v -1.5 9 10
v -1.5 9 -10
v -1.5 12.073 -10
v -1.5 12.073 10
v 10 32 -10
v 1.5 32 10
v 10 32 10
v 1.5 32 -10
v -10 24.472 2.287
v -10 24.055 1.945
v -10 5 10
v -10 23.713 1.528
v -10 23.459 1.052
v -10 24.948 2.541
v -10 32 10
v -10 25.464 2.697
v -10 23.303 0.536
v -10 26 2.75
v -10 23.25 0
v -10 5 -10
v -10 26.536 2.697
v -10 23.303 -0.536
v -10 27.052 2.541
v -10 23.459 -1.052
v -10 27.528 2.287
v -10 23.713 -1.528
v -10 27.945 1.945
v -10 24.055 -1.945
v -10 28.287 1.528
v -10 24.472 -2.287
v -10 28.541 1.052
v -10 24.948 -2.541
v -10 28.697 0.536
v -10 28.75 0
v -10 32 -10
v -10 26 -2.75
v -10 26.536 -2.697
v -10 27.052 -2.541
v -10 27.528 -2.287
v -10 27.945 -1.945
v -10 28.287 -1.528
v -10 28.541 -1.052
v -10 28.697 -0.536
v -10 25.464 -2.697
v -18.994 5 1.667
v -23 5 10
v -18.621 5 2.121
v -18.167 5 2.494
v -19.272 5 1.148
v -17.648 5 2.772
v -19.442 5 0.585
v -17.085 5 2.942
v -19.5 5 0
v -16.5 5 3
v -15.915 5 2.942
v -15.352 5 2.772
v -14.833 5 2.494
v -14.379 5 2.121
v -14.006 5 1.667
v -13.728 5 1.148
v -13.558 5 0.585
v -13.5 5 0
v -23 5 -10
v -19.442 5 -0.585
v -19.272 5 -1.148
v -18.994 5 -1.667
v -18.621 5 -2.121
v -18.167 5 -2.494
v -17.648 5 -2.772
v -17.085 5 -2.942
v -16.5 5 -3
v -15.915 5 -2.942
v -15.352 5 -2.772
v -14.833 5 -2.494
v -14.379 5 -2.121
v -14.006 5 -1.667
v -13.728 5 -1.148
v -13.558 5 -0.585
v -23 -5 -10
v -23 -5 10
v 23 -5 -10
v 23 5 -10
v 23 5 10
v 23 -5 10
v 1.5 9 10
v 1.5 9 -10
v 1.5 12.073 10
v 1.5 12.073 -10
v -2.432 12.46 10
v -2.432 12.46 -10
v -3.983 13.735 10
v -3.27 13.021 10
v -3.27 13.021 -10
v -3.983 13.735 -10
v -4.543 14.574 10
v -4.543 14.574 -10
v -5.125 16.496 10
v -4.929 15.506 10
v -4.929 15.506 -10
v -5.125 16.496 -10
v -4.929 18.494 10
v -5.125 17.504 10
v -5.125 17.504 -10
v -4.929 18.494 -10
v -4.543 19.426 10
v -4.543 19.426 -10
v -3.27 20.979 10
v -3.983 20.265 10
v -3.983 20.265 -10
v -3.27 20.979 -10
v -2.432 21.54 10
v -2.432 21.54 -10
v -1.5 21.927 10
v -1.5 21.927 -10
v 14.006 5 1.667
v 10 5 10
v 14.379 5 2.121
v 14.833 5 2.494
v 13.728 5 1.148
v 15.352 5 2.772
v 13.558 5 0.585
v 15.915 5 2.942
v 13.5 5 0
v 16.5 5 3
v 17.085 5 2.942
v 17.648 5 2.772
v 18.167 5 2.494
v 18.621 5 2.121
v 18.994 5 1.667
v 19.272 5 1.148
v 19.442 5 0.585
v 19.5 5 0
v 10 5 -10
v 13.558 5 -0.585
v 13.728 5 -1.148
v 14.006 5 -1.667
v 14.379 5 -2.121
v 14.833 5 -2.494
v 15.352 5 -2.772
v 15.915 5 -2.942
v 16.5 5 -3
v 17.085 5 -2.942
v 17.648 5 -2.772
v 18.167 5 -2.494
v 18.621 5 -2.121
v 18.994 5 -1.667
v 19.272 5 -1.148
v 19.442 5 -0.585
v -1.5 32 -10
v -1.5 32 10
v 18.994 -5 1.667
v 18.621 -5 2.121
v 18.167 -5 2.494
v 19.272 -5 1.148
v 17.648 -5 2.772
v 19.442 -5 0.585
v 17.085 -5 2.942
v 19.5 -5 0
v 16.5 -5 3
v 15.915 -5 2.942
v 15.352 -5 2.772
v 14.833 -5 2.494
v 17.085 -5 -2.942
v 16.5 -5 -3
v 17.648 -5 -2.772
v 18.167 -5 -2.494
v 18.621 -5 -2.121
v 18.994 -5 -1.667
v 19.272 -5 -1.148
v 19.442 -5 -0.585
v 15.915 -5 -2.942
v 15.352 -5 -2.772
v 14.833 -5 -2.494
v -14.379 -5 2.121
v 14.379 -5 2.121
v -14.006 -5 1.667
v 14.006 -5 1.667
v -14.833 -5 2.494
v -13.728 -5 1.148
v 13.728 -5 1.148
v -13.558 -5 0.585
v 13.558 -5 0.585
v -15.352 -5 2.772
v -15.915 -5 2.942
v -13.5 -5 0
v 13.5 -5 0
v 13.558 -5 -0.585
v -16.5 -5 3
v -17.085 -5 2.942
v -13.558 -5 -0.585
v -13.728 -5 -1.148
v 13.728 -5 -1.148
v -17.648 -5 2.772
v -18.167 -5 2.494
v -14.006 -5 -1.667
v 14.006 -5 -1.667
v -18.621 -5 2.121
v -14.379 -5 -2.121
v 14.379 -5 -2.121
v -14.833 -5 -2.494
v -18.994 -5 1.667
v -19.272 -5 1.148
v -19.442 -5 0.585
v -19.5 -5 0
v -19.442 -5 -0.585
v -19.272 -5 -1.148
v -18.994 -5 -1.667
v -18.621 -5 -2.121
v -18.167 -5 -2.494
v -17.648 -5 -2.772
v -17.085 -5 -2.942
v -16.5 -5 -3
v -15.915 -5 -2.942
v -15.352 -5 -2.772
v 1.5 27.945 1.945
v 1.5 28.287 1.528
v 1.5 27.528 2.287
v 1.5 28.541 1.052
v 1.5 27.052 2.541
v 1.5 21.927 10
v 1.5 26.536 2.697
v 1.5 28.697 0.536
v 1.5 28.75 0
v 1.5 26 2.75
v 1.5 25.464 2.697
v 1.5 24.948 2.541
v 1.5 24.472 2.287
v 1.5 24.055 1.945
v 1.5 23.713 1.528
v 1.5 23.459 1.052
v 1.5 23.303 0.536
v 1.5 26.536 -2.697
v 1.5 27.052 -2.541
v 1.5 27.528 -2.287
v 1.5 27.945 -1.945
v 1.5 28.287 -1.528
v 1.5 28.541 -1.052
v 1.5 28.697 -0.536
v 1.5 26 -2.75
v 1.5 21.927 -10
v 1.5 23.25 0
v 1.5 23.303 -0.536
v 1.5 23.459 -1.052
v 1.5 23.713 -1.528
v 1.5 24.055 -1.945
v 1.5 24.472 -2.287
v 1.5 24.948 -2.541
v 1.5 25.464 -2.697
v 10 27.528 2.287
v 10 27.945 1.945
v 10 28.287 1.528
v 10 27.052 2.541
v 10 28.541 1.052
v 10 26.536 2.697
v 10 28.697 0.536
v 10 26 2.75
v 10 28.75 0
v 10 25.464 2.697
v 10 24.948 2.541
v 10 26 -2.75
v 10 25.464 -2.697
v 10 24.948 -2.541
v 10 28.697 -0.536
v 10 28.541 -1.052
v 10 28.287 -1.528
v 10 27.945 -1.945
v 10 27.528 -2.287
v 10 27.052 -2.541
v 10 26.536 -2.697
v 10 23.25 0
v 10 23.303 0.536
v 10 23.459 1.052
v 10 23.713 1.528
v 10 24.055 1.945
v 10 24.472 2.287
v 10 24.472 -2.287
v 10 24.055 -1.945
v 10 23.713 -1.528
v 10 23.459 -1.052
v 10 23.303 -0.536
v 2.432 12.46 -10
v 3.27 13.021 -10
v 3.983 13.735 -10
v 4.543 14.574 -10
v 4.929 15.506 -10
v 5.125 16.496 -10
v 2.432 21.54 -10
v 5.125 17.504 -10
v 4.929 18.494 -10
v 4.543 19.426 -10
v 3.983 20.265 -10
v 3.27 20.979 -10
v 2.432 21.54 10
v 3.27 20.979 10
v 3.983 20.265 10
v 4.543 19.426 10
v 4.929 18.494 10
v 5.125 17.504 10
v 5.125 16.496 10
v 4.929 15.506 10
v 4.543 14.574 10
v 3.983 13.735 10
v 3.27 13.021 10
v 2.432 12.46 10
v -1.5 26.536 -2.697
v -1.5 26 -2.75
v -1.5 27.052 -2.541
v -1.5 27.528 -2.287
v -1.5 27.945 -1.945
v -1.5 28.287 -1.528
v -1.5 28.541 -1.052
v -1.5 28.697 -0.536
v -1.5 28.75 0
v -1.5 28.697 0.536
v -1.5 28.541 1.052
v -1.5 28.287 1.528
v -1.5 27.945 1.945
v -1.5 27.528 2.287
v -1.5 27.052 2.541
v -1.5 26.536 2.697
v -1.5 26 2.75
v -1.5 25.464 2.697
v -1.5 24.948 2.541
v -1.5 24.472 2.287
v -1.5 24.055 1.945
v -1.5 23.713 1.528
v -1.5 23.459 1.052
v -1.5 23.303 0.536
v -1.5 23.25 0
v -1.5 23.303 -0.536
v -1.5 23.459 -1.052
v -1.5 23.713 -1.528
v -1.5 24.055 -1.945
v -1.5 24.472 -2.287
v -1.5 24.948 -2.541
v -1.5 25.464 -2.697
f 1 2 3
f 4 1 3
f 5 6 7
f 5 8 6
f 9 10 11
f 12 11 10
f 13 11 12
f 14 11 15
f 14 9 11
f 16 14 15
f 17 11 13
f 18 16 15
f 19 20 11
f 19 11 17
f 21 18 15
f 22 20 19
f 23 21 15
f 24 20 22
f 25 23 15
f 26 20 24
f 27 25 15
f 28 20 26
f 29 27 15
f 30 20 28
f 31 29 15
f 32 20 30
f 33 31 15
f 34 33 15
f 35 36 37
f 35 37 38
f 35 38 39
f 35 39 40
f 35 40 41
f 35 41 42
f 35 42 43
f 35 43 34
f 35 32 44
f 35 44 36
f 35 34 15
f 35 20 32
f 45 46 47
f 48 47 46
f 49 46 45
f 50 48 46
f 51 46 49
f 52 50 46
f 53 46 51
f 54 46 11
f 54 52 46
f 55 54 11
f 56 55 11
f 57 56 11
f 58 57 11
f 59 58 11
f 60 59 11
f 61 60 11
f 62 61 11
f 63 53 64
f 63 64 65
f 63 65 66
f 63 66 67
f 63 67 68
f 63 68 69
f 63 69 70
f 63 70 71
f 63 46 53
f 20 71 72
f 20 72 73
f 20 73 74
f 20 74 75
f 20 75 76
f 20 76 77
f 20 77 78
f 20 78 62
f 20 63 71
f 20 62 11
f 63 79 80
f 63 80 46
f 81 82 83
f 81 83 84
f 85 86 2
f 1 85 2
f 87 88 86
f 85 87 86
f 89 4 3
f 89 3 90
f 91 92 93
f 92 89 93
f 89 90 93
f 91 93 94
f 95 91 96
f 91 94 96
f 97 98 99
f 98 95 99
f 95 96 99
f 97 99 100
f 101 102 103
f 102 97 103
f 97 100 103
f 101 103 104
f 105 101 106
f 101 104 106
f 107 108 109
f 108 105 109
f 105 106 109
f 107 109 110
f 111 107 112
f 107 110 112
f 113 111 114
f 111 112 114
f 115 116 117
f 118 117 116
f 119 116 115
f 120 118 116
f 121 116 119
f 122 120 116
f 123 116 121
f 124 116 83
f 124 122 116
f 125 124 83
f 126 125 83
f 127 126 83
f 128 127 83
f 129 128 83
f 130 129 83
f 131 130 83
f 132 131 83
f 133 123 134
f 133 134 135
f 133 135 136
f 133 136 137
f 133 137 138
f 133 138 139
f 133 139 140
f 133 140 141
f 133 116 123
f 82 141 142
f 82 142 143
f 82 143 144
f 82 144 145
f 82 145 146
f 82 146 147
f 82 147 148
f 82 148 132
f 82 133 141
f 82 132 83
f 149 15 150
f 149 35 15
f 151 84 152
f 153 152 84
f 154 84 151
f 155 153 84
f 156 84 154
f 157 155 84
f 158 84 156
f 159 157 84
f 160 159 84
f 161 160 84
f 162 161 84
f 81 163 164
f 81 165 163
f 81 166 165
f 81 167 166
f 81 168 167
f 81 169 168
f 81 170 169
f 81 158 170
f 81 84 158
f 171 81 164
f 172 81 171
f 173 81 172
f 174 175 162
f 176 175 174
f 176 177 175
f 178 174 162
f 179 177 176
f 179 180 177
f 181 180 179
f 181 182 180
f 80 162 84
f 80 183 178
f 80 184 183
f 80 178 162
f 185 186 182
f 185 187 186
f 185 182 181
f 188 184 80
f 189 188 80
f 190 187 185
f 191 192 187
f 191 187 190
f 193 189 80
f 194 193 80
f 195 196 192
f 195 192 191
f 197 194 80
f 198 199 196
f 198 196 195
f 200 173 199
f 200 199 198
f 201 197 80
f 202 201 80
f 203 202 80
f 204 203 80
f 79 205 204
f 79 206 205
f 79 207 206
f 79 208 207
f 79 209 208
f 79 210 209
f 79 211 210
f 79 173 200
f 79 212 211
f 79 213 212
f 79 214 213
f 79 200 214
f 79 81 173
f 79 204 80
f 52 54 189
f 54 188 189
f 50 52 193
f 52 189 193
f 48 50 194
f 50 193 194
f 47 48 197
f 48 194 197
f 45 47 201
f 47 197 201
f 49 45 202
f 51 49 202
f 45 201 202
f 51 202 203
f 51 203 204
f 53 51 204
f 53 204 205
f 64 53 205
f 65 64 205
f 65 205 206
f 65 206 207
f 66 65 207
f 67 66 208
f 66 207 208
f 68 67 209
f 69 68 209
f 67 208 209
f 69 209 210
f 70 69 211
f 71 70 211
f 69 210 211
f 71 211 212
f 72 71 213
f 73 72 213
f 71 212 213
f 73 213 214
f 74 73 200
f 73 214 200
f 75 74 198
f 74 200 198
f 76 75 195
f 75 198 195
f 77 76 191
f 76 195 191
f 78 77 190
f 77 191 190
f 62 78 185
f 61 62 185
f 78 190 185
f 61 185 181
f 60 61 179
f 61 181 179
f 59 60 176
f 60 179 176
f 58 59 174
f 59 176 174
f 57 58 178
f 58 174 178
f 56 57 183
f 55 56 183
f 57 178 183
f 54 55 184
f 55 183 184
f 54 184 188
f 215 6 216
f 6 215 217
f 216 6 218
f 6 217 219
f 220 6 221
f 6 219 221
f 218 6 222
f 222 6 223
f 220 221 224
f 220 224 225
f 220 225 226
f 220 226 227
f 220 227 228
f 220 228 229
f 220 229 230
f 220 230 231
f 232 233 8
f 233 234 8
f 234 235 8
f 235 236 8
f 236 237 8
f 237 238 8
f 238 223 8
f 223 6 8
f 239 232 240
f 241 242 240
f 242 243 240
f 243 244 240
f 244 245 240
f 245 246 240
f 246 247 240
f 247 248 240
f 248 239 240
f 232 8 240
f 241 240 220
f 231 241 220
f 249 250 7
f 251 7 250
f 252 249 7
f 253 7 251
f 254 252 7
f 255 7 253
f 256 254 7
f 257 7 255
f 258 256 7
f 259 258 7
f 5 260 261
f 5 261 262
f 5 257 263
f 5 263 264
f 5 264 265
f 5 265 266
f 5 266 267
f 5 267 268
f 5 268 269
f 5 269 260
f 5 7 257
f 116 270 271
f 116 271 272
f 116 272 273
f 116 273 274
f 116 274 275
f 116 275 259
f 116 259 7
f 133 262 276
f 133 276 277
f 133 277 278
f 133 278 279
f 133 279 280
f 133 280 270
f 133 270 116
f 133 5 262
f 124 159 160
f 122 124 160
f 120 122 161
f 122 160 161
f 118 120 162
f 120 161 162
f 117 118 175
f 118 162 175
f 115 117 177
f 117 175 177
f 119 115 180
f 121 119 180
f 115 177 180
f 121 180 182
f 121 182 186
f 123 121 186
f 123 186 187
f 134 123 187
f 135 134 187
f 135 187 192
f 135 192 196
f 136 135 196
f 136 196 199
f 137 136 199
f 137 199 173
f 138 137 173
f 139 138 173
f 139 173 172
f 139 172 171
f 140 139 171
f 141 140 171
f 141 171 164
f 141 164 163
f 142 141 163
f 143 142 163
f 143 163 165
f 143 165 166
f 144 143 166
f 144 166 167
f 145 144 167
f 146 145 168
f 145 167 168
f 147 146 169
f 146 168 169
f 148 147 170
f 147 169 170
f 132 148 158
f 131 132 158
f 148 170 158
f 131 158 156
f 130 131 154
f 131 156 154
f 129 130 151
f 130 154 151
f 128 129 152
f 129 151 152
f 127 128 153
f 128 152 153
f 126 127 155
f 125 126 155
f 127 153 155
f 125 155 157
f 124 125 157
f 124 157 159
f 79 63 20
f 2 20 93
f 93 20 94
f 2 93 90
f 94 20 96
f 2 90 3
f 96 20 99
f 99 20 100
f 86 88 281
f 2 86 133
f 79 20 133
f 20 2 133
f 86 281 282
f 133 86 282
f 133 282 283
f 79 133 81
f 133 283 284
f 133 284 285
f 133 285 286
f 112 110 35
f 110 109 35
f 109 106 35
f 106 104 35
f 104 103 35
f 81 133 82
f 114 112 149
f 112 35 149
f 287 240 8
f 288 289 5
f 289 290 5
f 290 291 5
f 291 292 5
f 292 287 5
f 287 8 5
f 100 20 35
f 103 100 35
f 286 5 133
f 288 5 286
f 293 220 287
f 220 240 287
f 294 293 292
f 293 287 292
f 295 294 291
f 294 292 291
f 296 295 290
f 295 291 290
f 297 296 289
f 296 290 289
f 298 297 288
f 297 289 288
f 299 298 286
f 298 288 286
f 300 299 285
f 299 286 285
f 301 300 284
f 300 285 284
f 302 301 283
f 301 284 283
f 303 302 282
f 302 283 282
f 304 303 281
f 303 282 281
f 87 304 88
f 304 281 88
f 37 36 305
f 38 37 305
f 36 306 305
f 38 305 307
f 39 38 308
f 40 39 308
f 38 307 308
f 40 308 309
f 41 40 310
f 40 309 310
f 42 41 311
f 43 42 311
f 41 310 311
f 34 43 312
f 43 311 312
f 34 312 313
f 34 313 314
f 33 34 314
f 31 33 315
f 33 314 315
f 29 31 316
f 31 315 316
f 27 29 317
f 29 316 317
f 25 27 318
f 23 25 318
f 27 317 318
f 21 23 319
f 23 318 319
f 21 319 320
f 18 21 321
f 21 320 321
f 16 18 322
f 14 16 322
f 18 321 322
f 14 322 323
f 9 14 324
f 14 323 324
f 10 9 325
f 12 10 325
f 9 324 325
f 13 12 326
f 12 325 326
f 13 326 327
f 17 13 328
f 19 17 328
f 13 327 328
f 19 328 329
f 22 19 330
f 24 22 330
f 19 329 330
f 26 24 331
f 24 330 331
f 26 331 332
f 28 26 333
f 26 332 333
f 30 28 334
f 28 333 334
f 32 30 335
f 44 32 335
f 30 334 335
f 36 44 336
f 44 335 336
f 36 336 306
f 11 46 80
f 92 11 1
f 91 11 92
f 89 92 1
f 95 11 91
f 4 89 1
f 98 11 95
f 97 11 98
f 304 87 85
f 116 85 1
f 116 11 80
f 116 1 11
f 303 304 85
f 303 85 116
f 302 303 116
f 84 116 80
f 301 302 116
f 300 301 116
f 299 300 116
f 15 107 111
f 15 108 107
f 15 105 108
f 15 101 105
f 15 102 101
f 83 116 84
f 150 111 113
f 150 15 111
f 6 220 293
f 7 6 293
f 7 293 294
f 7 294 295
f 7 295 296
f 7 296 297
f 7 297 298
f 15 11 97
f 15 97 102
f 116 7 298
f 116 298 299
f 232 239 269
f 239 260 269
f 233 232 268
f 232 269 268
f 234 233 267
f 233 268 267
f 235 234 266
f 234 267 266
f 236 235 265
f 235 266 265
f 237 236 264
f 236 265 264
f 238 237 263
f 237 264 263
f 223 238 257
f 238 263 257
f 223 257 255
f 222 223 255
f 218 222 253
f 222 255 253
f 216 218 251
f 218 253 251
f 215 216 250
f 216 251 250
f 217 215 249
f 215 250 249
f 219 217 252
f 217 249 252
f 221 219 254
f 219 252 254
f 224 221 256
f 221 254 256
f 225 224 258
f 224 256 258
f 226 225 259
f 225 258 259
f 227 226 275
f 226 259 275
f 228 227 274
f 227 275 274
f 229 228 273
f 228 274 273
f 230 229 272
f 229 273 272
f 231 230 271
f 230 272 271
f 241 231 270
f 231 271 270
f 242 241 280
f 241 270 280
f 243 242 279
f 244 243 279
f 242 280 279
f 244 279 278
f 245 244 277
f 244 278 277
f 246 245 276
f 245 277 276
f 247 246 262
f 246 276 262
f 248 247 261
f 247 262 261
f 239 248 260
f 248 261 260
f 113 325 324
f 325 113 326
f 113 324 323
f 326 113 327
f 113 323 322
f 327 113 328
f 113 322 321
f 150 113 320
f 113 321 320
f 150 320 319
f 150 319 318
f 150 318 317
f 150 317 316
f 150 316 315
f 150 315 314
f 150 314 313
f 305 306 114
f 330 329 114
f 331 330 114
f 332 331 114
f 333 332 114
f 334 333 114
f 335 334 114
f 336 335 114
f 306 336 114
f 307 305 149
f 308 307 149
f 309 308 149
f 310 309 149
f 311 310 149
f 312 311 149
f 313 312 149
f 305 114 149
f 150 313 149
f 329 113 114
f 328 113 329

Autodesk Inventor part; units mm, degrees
ref_plane "YZ Plane" through (0, 0, 0) normal (1, 0, 0) x (0, 1, 0)
ref_plane "XZ Plane" through (0, 0, 0) normal (0, 1, 0) x (-1, 0, 0)
ref_plane "XY Plane" through (0, 0, 0) normal (0, 0, 1) x (1, 0, 0)
sketch "Sketch1" plane through (0, 0, 0) normal (0, 0, 1) x (1, 0, 0)
  line L0 (-23, 5) -> (23, 5)
  line L1 (23, 5) -> (23, -5)
  line L2 (23, -5) -> (-23, -5)
  line L3 (-23, -5) -> (-23, 5)
  line L4 (-10, 32) -> (10, 32)
  line L5 (10, 32) -> (10, 5)
  line L6 (10, 5) -> (-10, 5)
  line L7 (-10, 5) -> (-10, 32)
  circle A0 centre (0, 17) radius 5.15
  line L8 (-1.5, 32) -> (1.5, 32)
  line L9 (1.5, 32) -> (1.5, 9)
  line L10 (1.5, 9) -> (-1.5, 9)
  line L11 (-1.5, 9) -> (-1.5, 32)
  point P0 (0, 0)
  point P1 (-23, 0)
  point P2 (0, 5)
  point P3 (0, 32)
  point P4 (0, 32)
  point P5 (-1.5, 12.0733)
  point P6 (-1.5, 21.9267)
  point P7 (-1.5, 32)
  point P8 (-10, 5)
  point P9 (10, 5)
  point P10 (1.5, 32)
  point P11 (1.5, 21.9267)
  point P12 (1.5, 12.0733)
  dimension "d0" = 10
  dimension "d1" = 20
  dimension "d2" = 10.3
  dimension "d3" = 12
  dimension "d4" = 15
  dimension "d5" = 3
  dimension "d6" = 8
  dimension "d7" = 13
extrude "Extrusion1" add sketch "Sketch1" along normal mid plane 20 contours L0 L1 L2 L3 | L7 L4 L11 A0 L10 L9 L5 L0
sketch "Sketch2" plane through (10, 5, 10) normal (0, 1, 0) x (1, 0, 0)
  line L0 (0, 20) -> (13, 20) projected
  line L1 (-33, 20) -> (-20, 20) projected
  line L2 (-33, 20) -> (-33, 0) projected
  line L3 (13, 20) -> (13, 0) projected
  point P0 (-10, 10)
  point P1 (-26.5, 10)
  point P2 (6.5, 10)
  point P3 (6.5, 20)
  point P4 (-26.5, 20)
  point P5 (-33, 10)
  point P6 (13, 10)
hole "Hole1" at (-16.5, 5, 0) at (16.5, 5, 0) direction (0, -1, 0) diameter 6 end through all
sketch "Sketch3" plane through (10, 5, 10) normal (1, 0, 0) x (0, 0, -1)
  line L0 (20, 27) -> (0, 27) projected
  circle A0 centre (10, 21) radius 2.75
  line L1 (20, 27) -> (0, 27) projected
  line L2 (0, 27) -> (8, 27)
  line L3 (8, 27) -> (8, 0)
  line L4 (8, 0) -> (0, 0)
  line L5 (0, 0) -> (0, 27)
  line L6 (20, 0) -> (0, 0) projected
  line L7 (12, 27) -> (20, 27)
  line L8 (20, 27) -> (20, 0)
  line L9 (20, 0) -> (12, 0)
  line L10 (12, 0) -> (12, 27)
  line L11 (20, 27) -> (20, 0) projected
  point P0 (10, -5)
  point P1 (10, 27)
  point P2 (12, 0)
  dimension "d17" = 6
  dimension "d18" = 5.5
  dimension "d19" = 8
  dimension "d21" = 8
extrude "Extrusion2" cut sketch "Sketch3" against normal through all contours L10 A0 L3 | A0 L10 | L3 A0
equation "\"d21\" = d19"
properties part number "0008-10-019 Suport Axa Y"
